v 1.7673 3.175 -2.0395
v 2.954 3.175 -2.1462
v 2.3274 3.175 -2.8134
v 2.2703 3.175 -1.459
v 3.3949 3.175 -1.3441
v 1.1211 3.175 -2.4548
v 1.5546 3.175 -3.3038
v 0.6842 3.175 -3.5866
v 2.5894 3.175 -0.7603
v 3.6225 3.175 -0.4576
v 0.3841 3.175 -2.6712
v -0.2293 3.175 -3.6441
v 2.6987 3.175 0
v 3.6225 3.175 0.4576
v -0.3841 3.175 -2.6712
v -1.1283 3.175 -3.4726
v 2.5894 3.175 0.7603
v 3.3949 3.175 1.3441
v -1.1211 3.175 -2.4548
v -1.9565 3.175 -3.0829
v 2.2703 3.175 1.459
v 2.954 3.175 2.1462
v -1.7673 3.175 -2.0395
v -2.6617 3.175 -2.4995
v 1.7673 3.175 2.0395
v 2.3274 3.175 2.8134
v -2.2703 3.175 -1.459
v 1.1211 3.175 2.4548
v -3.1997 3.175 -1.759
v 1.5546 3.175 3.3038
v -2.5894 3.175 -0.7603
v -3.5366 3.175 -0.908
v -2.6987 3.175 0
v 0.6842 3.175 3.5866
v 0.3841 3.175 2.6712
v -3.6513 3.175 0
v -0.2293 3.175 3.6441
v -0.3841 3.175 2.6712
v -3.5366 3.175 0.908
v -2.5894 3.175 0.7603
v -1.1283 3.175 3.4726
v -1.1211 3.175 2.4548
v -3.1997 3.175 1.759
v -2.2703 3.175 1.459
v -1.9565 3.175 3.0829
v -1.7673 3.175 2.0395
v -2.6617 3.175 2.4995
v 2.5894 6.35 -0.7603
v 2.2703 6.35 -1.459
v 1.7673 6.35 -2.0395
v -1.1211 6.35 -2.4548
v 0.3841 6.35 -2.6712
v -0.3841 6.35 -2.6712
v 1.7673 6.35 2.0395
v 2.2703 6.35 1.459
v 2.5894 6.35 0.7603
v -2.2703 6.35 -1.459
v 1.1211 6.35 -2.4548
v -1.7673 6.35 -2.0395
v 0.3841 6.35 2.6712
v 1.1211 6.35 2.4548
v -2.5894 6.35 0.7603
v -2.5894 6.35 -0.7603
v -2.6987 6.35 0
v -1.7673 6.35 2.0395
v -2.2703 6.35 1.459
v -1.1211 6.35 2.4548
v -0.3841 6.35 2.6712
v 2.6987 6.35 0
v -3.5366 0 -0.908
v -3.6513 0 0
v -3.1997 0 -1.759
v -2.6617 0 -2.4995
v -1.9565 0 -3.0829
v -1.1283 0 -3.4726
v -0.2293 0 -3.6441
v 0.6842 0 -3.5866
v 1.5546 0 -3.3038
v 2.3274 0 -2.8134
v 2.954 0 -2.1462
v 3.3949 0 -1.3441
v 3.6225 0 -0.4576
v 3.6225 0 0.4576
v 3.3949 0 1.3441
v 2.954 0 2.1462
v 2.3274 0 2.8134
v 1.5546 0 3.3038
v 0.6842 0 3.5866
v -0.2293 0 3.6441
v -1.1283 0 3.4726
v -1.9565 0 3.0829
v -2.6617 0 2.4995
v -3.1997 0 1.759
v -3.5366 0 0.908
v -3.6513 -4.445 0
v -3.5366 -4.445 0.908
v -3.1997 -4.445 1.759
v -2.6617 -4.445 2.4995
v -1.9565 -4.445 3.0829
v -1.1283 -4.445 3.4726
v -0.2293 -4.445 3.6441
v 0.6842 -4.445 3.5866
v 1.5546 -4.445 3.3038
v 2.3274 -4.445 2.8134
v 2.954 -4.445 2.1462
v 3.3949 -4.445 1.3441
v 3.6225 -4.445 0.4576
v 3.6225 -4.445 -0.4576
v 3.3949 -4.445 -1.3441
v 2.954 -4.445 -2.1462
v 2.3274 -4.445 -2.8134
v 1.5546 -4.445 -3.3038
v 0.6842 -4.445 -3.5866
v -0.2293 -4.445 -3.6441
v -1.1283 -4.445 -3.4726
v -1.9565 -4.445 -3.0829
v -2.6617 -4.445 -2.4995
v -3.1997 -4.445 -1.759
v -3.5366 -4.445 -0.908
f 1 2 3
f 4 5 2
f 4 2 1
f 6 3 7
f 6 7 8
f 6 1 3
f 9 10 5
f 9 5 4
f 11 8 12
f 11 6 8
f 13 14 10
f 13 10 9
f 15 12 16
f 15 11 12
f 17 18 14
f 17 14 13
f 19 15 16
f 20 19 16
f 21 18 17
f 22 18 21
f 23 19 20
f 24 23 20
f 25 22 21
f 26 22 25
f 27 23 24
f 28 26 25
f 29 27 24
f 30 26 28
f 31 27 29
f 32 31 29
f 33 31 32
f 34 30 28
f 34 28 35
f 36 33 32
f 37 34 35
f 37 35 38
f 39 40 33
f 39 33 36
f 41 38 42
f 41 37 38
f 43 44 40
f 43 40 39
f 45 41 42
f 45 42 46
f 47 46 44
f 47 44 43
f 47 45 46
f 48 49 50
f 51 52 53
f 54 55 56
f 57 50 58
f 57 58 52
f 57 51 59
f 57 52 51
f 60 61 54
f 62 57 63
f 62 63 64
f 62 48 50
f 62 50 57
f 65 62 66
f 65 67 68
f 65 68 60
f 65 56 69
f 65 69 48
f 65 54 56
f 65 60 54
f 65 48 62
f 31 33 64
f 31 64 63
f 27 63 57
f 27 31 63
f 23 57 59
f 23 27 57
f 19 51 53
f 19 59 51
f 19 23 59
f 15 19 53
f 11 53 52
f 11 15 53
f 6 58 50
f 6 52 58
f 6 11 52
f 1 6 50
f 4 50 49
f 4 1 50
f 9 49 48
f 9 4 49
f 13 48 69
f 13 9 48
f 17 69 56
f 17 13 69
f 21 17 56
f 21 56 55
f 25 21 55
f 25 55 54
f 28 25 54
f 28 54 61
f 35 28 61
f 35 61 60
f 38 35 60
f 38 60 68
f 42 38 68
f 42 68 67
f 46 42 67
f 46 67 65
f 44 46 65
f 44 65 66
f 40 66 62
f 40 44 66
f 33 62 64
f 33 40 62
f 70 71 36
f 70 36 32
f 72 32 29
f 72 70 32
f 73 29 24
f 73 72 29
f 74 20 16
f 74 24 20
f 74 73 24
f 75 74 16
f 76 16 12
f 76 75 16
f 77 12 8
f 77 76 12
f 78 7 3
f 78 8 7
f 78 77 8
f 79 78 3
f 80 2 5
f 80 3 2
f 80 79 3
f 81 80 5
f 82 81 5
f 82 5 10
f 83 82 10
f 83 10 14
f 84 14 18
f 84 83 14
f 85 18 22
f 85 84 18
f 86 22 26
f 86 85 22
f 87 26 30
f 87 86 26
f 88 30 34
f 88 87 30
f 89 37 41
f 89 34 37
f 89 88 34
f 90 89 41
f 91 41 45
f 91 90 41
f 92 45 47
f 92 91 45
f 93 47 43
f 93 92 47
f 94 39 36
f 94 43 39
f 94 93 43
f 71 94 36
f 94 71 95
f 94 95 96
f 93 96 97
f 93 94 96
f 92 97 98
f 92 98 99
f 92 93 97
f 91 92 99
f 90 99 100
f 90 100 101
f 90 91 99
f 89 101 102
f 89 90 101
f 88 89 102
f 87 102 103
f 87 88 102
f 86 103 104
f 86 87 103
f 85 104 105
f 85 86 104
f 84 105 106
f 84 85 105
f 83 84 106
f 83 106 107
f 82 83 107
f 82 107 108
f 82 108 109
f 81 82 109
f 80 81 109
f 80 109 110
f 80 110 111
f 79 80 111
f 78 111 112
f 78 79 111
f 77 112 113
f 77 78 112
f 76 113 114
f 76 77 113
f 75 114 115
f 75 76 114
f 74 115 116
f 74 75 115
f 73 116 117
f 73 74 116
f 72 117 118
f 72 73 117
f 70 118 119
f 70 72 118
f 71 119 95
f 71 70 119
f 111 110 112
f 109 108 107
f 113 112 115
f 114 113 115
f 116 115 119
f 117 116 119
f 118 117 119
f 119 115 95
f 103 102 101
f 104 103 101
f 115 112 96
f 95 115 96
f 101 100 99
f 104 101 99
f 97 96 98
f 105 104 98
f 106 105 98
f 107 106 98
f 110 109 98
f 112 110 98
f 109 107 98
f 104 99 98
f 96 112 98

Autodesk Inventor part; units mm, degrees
ref_plane "YZ Plane" through (0, 0, 0) normal (1, 0, 0) x (0, 1, 0)
ref_plane "XZ Plane" through (0, 0, 0) normal (0, 1, 0) x (-1, 0, 0)
ref_plane "XY Plane" through (0, 0, 0) normal (0, 0, 1) x (1, 0, 0)
sketch "Sketch1" plane through (0, 0, 0) normal (0, 1, 0) x (-1, 0, 0)
  circle A0 centre (0, 0) radius 3.6513
  circle A1 centre (0, 0) radius 2.6987
  dimension "d0" = 7.3025
  dimension "d1" = 5.3975
extrude "Extrusion1" add sketch "Sketch1" along normal blind 6.35 contours A1
extrude "Extrusion2" add sketch "Sketch1" along normal blind 3.175
extrude "Extrusion3" add sketch "Sketch1" against normal blind 4.445 contours A0 | A1
properties part number "Track v3 Button"
